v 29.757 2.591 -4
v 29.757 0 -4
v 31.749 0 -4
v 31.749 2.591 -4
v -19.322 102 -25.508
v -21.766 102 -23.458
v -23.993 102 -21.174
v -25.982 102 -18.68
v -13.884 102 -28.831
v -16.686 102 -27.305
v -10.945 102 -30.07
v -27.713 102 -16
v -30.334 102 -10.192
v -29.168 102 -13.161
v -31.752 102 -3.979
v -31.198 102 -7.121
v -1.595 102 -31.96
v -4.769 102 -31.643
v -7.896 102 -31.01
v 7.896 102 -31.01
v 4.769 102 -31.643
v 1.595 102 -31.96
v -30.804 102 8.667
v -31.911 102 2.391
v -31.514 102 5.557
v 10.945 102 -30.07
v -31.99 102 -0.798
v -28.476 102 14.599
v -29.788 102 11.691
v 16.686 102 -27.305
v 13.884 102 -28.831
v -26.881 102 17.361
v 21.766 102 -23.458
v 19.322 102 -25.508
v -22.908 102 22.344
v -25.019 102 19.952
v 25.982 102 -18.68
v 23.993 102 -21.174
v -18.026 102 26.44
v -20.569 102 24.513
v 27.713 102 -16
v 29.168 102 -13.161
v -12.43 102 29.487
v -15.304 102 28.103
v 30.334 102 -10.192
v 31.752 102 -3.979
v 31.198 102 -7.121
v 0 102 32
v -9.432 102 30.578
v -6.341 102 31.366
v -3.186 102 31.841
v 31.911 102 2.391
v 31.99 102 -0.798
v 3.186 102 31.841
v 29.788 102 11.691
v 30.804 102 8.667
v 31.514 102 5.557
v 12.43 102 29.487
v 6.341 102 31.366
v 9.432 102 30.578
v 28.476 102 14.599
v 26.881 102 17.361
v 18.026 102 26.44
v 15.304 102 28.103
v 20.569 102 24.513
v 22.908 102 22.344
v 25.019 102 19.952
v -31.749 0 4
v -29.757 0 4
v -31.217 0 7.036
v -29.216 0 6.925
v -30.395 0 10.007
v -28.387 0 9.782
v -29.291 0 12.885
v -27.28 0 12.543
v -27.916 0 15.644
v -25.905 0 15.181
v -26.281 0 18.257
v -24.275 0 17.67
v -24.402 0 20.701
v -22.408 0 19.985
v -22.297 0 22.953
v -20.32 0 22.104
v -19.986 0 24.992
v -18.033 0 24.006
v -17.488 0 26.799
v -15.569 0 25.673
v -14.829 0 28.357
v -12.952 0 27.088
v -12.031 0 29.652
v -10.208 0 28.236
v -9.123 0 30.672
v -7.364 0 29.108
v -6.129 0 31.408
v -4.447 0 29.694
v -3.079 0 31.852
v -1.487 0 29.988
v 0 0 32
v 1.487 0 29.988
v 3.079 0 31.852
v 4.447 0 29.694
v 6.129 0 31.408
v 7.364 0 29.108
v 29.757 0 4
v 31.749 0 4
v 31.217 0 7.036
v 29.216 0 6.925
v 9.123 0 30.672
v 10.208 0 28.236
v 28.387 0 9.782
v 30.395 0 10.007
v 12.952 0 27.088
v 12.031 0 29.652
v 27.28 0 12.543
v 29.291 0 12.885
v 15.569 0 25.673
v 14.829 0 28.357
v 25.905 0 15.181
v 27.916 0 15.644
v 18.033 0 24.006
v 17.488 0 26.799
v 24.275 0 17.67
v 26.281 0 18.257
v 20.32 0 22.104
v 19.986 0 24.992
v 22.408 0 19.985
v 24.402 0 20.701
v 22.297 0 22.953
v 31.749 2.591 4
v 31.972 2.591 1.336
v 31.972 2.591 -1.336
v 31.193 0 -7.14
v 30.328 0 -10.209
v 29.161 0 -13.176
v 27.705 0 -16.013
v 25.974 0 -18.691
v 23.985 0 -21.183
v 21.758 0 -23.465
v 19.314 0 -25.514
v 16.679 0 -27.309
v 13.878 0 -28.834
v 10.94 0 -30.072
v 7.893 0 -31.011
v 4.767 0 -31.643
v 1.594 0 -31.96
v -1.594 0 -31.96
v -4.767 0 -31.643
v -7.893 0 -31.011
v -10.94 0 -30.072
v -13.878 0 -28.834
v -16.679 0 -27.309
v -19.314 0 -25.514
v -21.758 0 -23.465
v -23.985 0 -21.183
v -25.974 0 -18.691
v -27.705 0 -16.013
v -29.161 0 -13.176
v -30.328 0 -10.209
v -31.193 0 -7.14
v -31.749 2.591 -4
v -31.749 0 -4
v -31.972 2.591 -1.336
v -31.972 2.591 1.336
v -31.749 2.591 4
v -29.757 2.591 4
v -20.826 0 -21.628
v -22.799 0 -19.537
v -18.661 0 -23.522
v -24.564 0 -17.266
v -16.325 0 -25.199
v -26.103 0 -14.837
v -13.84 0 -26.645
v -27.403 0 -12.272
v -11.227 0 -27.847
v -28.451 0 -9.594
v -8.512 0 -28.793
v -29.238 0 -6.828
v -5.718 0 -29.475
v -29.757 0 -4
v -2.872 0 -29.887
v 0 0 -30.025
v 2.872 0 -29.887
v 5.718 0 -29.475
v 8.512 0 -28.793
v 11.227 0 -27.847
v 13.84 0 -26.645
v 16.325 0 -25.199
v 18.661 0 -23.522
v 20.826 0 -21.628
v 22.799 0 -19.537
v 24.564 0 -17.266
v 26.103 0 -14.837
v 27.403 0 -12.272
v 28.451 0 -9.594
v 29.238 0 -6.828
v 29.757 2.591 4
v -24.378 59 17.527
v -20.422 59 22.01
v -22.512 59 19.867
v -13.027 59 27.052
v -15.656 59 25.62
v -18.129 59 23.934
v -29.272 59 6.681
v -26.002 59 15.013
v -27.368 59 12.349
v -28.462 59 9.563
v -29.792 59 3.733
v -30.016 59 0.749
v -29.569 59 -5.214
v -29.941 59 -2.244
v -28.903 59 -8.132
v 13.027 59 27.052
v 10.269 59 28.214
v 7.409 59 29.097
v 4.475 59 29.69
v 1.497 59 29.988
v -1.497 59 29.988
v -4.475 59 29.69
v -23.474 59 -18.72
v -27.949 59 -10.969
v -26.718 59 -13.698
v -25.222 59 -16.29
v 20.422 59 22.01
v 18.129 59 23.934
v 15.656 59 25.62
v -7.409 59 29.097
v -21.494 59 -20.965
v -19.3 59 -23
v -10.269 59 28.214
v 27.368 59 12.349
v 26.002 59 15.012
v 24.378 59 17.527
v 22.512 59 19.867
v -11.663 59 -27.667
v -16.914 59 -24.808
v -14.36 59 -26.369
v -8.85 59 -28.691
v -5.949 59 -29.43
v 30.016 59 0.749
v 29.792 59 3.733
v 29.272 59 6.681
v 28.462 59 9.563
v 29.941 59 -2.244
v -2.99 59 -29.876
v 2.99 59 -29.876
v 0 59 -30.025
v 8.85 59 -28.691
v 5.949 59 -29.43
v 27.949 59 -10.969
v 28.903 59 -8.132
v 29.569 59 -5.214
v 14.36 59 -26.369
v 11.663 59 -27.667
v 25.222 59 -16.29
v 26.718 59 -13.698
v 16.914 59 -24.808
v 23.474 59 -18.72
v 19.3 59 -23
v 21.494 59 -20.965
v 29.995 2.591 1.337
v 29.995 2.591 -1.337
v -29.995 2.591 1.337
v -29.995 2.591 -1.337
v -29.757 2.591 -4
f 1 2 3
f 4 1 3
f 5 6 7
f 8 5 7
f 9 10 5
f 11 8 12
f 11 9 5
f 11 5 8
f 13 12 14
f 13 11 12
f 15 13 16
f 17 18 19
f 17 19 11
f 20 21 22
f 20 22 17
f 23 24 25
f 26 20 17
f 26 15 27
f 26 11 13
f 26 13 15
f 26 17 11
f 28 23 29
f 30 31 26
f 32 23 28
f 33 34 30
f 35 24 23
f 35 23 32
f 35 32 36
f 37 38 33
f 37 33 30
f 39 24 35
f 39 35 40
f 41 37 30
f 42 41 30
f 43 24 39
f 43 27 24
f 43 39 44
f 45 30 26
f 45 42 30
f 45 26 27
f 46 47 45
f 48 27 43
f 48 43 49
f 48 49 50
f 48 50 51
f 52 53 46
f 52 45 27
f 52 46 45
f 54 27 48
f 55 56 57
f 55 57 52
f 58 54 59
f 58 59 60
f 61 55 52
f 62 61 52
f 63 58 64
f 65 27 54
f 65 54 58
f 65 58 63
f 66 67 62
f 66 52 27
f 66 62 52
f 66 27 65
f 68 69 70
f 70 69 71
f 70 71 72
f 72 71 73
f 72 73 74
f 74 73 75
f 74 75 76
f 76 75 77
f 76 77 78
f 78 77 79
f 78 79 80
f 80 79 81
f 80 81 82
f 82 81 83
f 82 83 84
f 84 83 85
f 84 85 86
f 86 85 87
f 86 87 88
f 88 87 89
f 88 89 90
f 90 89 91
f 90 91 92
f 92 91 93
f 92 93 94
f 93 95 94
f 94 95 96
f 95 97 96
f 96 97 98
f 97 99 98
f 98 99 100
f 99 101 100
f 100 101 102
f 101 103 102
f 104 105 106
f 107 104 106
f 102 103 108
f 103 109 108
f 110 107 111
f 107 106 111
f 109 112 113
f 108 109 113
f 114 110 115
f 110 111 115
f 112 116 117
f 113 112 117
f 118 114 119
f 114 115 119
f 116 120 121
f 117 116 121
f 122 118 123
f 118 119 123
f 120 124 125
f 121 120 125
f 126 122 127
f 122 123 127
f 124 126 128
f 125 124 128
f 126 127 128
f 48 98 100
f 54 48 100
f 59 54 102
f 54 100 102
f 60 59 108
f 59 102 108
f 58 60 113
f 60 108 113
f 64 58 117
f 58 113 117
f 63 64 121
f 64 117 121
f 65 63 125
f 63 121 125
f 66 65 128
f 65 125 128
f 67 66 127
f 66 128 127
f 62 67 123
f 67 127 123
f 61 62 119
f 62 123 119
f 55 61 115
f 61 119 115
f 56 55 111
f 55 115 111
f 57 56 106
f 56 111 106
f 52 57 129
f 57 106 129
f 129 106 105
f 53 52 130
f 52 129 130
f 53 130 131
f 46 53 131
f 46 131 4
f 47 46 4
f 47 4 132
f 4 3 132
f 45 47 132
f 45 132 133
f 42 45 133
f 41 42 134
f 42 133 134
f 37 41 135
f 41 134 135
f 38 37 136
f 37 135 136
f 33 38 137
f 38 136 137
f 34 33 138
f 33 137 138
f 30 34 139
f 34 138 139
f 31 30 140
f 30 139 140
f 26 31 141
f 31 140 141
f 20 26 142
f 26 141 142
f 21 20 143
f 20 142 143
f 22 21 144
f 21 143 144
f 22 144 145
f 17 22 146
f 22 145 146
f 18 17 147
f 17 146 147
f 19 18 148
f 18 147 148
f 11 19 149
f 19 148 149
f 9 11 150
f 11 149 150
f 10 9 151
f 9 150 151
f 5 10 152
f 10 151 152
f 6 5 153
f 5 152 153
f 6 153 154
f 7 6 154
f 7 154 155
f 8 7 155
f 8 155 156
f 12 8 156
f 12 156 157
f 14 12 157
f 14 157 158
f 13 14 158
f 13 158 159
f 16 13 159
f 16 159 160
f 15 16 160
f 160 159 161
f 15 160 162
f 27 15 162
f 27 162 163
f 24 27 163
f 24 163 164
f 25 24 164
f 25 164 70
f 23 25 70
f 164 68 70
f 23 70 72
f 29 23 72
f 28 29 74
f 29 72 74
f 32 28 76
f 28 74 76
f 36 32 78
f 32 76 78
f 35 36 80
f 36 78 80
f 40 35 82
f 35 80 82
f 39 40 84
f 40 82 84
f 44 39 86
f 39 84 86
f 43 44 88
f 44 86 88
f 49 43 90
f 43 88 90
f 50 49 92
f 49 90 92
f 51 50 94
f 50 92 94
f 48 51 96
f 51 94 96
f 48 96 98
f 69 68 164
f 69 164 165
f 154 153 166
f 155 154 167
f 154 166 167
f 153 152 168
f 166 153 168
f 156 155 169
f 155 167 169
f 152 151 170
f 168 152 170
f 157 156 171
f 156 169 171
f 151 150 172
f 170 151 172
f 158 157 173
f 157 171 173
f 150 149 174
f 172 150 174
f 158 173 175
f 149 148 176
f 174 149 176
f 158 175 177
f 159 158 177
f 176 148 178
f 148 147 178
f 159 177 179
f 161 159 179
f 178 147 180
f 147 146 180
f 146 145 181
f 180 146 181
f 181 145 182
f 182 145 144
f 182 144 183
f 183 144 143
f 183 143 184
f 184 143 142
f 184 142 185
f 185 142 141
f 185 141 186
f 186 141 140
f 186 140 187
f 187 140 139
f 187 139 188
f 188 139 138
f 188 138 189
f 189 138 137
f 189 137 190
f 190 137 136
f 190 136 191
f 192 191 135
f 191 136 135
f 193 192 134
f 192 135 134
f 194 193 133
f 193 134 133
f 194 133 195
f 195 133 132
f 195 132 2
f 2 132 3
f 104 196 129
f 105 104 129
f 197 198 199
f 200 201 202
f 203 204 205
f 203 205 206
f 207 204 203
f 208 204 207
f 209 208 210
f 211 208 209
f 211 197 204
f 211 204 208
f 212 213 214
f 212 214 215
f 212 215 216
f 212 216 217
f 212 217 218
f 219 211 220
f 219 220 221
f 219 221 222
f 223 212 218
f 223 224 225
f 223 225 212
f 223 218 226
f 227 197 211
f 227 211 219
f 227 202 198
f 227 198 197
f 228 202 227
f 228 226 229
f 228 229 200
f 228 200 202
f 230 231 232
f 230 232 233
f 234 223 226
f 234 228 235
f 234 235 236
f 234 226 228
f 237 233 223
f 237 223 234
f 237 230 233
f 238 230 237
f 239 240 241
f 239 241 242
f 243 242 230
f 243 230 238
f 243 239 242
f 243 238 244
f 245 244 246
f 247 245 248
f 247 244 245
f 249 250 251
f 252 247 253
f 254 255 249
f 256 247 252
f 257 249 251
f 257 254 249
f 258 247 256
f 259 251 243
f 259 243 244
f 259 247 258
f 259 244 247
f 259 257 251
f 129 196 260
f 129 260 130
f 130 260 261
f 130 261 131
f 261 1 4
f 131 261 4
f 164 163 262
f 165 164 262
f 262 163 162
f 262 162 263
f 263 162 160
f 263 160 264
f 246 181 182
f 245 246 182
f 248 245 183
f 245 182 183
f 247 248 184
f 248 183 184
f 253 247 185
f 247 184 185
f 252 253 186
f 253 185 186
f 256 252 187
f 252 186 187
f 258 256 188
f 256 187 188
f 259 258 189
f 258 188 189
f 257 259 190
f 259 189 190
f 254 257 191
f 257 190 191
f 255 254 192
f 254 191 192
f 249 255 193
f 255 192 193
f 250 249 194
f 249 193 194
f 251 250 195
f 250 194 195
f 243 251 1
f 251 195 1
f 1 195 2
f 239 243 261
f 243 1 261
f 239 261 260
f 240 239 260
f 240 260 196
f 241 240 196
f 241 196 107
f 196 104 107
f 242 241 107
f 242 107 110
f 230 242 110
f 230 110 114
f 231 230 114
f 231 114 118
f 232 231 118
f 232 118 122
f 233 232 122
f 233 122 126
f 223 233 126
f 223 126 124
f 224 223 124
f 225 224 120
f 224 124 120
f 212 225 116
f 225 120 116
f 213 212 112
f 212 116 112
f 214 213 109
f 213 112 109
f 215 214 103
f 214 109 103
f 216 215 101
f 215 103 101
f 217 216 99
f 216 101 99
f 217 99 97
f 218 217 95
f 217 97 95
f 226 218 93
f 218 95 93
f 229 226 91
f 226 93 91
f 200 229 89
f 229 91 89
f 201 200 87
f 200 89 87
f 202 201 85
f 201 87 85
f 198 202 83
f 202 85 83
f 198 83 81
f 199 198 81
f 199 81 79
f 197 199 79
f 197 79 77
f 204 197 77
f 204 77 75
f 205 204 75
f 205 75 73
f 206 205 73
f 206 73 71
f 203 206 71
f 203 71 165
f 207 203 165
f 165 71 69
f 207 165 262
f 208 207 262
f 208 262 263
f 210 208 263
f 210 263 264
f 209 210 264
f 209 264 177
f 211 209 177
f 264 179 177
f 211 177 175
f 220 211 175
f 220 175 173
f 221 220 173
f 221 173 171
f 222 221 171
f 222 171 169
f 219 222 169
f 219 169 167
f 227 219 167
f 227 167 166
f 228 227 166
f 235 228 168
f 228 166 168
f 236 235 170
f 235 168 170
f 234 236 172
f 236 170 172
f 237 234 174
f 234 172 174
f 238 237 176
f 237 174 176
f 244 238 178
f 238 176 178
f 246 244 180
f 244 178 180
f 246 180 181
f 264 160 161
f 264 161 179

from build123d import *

# Parameters (mm, degrees)
SKETCH1_R               = 32
BOSS_EXTRUDE1_DEPTH     = 100
SKETCH2_R               = 30.025
CUT_EXTRUDE1_DEPTH      = 59
SKETCH3_R               = 32
BOSS_EXTRUDE2_DEPTH     = 2
CUT_EXTRUDE2_DEPTH      = 4
CUT_EXTRUDE2_DEPTH_BACK = 4
SKETCH4_W               = 70.13553728
SKETCH4_H               = 5.843920962


with BuildPart() as part:
    # Sketch1 → Boss-Extrude1 (new body)
    with BuildSketch(Plane(origin=(0, 0, 0), x_dir=(1, 0, 0), z_dir=(0, 1, 0))):
        Circle(SKETCH1_R)
    extrude(amount=BOSS_EXTRUDE1_DEPTH)

    # Sketch2 → Cut-Extrude1 (cut)
    with BuildSketch(Plane.XZ):
        Circle(SKETCH2_R)
    extrude(amount=-CUT_EXTRUDE1_DEPTH, mode=Mode.SUBTRACT)

    # Sketch3 → Boss-Extrude2 (add)
    with BuildSketch(Plane(origin=(0, 100, 0), x_dir=(1, 0, 0), z_dir=(0, 1, 0))):
        Circle(SKETCH3_R)
    extrude(amount=BOSS_EXTRUDE2_DEPTH)

    # Sketch4 → Cut-Extrude2 (cut, two sides: drawn at the far end of the back side and taken through both)
    with BuildSketch(Plane.XY.offset(-CUT_EXTRUDE2_DEPTH_BACK)):
        with Locations((-0.197032679, -0.331379703)):
            Rectangle(SKETCH4_W, SKETCH4_H)
    extrude(amount=CUT_EXTRUDE2_DEPTH + CUT_EXTRUDE2_DEPTH_BACK, mode=Mode.SUBTRACT)


solid = part.part
